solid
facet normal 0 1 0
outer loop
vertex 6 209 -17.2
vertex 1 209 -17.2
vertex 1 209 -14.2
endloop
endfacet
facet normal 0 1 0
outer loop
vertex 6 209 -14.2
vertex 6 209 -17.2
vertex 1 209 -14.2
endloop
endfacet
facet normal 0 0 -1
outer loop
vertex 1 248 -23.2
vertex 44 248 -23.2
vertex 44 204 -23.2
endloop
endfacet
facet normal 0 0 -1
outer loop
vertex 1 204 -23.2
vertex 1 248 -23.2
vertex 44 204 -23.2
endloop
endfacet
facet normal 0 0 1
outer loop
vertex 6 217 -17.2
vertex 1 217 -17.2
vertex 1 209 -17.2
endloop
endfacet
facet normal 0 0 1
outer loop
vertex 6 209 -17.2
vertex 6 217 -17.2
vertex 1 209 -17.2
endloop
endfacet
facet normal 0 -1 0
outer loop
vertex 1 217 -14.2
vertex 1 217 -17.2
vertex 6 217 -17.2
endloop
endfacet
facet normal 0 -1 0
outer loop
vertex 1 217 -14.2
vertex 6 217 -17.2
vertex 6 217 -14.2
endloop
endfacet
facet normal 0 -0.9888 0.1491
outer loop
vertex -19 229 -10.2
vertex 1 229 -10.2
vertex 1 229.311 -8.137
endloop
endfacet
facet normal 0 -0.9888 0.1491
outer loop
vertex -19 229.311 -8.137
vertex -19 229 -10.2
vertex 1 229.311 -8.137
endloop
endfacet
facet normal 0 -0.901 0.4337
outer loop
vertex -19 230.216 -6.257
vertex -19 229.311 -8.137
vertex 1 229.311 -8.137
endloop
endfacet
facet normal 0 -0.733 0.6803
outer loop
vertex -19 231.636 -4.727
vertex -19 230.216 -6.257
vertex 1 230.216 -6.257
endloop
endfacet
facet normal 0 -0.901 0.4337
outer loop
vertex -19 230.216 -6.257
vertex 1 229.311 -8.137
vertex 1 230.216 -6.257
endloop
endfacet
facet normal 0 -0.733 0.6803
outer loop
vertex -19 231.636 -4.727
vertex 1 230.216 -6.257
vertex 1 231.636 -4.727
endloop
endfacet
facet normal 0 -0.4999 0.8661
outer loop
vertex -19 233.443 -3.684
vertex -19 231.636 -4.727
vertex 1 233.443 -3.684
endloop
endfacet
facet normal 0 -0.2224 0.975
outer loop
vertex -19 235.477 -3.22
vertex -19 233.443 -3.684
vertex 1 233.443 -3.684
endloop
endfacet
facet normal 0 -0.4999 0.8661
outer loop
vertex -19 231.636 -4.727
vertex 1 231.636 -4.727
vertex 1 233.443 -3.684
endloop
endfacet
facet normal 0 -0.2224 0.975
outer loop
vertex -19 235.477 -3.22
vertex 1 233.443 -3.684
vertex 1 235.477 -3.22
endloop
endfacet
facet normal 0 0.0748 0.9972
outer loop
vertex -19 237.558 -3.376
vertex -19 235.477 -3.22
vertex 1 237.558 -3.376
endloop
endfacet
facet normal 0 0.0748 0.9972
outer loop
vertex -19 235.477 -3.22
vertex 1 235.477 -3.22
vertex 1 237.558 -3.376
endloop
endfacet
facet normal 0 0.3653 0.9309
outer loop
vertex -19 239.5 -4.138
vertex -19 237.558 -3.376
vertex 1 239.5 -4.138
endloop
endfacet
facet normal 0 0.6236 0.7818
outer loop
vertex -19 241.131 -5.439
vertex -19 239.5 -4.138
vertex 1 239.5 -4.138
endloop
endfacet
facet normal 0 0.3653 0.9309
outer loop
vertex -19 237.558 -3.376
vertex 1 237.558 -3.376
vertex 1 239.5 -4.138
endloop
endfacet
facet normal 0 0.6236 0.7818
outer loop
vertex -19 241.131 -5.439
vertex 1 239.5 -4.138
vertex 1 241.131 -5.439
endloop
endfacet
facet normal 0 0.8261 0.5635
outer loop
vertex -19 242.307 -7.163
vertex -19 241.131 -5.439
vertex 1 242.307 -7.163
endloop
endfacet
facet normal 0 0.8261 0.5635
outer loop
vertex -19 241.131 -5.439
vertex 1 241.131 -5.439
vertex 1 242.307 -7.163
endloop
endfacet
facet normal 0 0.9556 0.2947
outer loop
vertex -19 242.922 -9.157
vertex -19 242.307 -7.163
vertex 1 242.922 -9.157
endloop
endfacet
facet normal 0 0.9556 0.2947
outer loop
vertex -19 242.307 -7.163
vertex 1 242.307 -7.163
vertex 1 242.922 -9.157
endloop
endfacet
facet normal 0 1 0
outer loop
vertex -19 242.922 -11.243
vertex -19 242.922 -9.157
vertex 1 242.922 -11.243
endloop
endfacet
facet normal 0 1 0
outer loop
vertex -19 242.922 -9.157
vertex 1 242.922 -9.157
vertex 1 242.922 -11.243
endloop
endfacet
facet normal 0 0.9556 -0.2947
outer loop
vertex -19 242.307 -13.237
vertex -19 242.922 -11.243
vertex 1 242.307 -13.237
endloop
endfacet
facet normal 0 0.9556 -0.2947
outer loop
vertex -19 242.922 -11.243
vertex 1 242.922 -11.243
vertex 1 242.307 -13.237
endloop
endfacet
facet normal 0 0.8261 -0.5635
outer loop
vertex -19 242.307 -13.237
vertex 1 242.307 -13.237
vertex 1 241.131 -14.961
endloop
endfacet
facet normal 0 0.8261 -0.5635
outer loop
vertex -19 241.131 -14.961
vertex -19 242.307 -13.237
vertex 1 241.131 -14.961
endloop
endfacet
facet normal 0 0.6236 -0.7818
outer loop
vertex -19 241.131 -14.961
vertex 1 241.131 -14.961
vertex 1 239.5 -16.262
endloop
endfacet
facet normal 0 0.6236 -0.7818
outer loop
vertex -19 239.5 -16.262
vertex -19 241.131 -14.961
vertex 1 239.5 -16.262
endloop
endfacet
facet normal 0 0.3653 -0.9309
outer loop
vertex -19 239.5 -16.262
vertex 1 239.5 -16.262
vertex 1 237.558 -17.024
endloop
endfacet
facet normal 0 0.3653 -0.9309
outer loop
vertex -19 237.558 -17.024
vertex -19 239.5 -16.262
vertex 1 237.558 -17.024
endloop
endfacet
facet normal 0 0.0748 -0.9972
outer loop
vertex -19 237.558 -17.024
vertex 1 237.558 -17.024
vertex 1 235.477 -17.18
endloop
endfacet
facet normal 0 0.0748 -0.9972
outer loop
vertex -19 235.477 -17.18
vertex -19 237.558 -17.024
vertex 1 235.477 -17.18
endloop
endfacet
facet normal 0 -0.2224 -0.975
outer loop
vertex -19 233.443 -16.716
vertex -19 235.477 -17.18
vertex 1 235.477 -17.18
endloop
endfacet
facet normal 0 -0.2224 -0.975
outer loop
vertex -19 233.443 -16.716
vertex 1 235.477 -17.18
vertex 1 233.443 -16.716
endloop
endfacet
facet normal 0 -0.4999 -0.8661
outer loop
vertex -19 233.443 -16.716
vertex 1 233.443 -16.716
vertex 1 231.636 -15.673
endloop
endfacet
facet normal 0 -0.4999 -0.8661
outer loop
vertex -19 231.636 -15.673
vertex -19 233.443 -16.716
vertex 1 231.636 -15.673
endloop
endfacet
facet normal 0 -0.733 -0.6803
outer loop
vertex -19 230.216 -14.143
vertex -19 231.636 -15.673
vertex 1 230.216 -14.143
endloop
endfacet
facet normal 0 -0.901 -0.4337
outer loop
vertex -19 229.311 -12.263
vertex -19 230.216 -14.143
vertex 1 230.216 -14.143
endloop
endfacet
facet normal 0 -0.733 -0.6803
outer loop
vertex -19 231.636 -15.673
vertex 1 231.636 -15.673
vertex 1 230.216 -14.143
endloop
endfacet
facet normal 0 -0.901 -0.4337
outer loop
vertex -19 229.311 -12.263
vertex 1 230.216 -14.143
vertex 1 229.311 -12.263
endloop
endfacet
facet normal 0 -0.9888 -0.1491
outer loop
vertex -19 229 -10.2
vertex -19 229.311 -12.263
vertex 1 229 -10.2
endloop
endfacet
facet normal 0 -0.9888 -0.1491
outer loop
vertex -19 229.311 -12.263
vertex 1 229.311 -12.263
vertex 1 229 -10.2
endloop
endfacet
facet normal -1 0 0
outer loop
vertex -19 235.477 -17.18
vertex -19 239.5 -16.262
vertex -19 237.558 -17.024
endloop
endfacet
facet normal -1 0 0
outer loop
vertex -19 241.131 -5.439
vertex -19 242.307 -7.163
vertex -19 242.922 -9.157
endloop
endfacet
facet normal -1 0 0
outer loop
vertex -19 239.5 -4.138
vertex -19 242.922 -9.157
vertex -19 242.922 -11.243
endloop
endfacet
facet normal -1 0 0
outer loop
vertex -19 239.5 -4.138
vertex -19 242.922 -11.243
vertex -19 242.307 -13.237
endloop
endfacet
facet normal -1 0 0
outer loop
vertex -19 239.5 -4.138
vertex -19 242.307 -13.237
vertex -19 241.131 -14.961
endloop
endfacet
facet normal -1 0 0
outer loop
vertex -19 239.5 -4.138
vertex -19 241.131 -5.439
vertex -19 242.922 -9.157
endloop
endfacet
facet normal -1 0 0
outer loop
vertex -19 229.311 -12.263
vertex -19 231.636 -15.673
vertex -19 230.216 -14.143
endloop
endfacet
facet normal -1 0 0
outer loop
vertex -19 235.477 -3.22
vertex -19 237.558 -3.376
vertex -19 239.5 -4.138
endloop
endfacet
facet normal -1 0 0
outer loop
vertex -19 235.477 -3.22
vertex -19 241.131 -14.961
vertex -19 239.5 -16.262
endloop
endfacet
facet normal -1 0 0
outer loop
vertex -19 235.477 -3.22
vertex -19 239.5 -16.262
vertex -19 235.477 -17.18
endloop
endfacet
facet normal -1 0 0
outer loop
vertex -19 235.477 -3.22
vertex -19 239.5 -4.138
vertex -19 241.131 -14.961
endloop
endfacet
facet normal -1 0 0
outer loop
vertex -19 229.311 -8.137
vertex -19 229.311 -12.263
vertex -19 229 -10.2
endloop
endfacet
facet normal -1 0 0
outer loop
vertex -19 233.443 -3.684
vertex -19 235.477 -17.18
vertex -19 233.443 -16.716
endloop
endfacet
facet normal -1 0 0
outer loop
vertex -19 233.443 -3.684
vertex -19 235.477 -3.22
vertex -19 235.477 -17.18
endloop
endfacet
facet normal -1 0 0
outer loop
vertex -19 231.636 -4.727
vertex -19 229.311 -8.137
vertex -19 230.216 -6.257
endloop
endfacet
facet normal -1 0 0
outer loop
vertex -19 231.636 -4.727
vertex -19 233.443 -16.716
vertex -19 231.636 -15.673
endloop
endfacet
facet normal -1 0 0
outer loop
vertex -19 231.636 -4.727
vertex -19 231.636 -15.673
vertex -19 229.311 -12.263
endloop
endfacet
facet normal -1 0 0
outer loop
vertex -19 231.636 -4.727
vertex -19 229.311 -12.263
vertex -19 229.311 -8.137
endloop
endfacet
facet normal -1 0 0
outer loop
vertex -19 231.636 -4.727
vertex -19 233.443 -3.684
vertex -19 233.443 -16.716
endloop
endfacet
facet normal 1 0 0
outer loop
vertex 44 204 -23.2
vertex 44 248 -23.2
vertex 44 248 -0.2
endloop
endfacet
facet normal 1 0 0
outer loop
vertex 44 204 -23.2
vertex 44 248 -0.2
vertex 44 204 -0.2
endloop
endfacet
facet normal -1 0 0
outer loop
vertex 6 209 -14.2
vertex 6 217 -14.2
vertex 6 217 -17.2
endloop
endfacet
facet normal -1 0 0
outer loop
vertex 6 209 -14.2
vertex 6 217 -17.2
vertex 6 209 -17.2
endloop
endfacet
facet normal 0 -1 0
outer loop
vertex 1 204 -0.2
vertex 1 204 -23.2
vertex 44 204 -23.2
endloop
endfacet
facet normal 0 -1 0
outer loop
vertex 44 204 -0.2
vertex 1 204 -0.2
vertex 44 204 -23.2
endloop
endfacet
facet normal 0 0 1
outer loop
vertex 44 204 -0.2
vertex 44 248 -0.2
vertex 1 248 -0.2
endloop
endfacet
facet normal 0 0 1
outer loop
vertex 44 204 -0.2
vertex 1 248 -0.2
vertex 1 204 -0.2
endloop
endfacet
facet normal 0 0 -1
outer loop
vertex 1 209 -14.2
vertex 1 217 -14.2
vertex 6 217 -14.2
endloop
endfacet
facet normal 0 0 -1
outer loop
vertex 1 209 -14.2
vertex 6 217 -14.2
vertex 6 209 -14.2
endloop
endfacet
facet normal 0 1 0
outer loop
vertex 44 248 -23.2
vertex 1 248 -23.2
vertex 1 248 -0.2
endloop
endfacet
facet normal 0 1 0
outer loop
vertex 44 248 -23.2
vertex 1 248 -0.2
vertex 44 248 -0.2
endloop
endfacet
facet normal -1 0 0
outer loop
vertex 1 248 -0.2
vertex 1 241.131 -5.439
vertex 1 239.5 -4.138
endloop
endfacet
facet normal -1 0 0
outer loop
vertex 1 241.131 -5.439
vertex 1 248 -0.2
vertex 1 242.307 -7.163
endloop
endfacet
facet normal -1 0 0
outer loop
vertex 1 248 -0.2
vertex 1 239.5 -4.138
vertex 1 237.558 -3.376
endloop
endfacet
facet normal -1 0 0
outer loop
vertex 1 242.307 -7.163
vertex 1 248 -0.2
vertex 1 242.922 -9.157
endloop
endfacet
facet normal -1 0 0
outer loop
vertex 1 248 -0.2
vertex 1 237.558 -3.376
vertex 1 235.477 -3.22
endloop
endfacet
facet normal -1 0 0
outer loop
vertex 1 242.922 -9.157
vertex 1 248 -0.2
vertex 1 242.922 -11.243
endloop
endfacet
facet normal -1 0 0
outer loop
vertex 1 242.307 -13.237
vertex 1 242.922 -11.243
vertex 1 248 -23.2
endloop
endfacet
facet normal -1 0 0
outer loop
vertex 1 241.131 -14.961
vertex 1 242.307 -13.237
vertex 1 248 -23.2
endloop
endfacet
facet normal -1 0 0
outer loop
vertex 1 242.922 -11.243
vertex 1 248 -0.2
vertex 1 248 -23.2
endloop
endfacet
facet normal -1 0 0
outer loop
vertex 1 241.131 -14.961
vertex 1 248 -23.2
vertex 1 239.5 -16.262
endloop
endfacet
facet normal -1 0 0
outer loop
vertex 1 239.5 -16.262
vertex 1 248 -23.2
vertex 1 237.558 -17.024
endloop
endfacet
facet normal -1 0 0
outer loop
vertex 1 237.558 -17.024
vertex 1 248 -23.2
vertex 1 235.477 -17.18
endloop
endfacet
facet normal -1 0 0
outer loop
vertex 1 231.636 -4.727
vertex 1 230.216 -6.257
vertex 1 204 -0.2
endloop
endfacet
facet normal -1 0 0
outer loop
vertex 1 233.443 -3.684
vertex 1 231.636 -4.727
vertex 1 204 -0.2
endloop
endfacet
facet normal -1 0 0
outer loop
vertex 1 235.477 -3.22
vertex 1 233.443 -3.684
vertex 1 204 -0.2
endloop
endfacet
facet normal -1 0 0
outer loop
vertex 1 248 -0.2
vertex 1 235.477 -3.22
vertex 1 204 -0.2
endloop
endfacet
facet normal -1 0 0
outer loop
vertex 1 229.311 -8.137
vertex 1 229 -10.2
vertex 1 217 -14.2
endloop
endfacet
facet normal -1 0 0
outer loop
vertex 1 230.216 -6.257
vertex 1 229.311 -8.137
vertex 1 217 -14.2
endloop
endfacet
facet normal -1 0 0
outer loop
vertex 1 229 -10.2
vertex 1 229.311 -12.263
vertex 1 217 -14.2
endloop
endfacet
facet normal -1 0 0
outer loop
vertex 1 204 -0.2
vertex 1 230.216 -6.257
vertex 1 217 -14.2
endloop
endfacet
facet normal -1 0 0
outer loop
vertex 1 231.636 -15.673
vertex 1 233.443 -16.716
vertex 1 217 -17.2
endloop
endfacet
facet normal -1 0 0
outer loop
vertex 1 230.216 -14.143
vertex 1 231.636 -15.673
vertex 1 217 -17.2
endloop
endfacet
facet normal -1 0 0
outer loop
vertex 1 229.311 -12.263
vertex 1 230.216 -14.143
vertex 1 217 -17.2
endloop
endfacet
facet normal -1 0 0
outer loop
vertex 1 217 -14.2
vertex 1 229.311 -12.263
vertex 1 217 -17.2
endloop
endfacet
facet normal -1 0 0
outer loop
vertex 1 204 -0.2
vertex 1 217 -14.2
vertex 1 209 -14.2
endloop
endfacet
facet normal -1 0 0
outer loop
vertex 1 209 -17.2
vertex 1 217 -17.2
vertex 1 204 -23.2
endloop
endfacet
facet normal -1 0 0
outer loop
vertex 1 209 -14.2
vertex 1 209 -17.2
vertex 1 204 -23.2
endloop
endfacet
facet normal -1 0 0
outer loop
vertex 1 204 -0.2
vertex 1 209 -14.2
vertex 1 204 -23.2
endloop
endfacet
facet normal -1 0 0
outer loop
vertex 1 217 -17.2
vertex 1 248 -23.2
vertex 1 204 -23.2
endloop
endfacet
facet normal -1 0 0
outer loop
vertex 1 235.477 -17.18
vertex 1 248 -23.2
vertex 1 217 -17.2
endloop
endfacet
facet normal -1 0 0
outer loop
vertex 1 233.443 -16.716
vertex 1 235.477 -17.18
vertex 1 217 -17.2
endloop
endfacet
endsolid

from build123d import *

# Parameters (mm, degrees)
SKETCH009_W             = 44
SKETCH009_H             = 43
PAD006_DEPTH            = 23
SKETCH010_R             = 7
PAD007_DEPTH            = 20
SKETCH011_W             = 8
SKETCH011_H             = 3
POCKET002_DEPTH         = 5
BODY005_PLACEMENT_ANGLE = -90


with BuildPart() as part:
    # Sketch009 → Pad006 (new body)
    with BuildSketch(Plane.XY):
        with Locations((22, 21.5)):
            Rectangle(SKETCH009_W, SKETCH009_H)
    extrude(amount=PAD006_DEPTH)

    # Sketch010 (on Face1 of Pad006) → Pad007 (join)
    with BuildSketch(Plane.XZ):
        with Locations((12, 13)):
            Circle(SKETCH010_R)
    extrude(amount=PAD007_DEPTH)

    # Sketch011 (on Face3 of Pad007) → Pocket002 (cut)
    with BuildSketch(Plane.XZ):
        with Locations((35, 7.5)):
            Rectangle(SKETCH011_W, SKETCH011_H)
    extrude(amount=-POCKET002_DEPTH, mode=Mode.SUBTRACT)


with BuildPart() as part_1:
    # Body005 placement: moved
    add(part.part.moved(Location((1, 248, -23.2))).rotate(Axis((1, 248, -23.2), (0, 0, 1)), BODY005_PLACEMENT_ANGLE))


solid = part_1.part
